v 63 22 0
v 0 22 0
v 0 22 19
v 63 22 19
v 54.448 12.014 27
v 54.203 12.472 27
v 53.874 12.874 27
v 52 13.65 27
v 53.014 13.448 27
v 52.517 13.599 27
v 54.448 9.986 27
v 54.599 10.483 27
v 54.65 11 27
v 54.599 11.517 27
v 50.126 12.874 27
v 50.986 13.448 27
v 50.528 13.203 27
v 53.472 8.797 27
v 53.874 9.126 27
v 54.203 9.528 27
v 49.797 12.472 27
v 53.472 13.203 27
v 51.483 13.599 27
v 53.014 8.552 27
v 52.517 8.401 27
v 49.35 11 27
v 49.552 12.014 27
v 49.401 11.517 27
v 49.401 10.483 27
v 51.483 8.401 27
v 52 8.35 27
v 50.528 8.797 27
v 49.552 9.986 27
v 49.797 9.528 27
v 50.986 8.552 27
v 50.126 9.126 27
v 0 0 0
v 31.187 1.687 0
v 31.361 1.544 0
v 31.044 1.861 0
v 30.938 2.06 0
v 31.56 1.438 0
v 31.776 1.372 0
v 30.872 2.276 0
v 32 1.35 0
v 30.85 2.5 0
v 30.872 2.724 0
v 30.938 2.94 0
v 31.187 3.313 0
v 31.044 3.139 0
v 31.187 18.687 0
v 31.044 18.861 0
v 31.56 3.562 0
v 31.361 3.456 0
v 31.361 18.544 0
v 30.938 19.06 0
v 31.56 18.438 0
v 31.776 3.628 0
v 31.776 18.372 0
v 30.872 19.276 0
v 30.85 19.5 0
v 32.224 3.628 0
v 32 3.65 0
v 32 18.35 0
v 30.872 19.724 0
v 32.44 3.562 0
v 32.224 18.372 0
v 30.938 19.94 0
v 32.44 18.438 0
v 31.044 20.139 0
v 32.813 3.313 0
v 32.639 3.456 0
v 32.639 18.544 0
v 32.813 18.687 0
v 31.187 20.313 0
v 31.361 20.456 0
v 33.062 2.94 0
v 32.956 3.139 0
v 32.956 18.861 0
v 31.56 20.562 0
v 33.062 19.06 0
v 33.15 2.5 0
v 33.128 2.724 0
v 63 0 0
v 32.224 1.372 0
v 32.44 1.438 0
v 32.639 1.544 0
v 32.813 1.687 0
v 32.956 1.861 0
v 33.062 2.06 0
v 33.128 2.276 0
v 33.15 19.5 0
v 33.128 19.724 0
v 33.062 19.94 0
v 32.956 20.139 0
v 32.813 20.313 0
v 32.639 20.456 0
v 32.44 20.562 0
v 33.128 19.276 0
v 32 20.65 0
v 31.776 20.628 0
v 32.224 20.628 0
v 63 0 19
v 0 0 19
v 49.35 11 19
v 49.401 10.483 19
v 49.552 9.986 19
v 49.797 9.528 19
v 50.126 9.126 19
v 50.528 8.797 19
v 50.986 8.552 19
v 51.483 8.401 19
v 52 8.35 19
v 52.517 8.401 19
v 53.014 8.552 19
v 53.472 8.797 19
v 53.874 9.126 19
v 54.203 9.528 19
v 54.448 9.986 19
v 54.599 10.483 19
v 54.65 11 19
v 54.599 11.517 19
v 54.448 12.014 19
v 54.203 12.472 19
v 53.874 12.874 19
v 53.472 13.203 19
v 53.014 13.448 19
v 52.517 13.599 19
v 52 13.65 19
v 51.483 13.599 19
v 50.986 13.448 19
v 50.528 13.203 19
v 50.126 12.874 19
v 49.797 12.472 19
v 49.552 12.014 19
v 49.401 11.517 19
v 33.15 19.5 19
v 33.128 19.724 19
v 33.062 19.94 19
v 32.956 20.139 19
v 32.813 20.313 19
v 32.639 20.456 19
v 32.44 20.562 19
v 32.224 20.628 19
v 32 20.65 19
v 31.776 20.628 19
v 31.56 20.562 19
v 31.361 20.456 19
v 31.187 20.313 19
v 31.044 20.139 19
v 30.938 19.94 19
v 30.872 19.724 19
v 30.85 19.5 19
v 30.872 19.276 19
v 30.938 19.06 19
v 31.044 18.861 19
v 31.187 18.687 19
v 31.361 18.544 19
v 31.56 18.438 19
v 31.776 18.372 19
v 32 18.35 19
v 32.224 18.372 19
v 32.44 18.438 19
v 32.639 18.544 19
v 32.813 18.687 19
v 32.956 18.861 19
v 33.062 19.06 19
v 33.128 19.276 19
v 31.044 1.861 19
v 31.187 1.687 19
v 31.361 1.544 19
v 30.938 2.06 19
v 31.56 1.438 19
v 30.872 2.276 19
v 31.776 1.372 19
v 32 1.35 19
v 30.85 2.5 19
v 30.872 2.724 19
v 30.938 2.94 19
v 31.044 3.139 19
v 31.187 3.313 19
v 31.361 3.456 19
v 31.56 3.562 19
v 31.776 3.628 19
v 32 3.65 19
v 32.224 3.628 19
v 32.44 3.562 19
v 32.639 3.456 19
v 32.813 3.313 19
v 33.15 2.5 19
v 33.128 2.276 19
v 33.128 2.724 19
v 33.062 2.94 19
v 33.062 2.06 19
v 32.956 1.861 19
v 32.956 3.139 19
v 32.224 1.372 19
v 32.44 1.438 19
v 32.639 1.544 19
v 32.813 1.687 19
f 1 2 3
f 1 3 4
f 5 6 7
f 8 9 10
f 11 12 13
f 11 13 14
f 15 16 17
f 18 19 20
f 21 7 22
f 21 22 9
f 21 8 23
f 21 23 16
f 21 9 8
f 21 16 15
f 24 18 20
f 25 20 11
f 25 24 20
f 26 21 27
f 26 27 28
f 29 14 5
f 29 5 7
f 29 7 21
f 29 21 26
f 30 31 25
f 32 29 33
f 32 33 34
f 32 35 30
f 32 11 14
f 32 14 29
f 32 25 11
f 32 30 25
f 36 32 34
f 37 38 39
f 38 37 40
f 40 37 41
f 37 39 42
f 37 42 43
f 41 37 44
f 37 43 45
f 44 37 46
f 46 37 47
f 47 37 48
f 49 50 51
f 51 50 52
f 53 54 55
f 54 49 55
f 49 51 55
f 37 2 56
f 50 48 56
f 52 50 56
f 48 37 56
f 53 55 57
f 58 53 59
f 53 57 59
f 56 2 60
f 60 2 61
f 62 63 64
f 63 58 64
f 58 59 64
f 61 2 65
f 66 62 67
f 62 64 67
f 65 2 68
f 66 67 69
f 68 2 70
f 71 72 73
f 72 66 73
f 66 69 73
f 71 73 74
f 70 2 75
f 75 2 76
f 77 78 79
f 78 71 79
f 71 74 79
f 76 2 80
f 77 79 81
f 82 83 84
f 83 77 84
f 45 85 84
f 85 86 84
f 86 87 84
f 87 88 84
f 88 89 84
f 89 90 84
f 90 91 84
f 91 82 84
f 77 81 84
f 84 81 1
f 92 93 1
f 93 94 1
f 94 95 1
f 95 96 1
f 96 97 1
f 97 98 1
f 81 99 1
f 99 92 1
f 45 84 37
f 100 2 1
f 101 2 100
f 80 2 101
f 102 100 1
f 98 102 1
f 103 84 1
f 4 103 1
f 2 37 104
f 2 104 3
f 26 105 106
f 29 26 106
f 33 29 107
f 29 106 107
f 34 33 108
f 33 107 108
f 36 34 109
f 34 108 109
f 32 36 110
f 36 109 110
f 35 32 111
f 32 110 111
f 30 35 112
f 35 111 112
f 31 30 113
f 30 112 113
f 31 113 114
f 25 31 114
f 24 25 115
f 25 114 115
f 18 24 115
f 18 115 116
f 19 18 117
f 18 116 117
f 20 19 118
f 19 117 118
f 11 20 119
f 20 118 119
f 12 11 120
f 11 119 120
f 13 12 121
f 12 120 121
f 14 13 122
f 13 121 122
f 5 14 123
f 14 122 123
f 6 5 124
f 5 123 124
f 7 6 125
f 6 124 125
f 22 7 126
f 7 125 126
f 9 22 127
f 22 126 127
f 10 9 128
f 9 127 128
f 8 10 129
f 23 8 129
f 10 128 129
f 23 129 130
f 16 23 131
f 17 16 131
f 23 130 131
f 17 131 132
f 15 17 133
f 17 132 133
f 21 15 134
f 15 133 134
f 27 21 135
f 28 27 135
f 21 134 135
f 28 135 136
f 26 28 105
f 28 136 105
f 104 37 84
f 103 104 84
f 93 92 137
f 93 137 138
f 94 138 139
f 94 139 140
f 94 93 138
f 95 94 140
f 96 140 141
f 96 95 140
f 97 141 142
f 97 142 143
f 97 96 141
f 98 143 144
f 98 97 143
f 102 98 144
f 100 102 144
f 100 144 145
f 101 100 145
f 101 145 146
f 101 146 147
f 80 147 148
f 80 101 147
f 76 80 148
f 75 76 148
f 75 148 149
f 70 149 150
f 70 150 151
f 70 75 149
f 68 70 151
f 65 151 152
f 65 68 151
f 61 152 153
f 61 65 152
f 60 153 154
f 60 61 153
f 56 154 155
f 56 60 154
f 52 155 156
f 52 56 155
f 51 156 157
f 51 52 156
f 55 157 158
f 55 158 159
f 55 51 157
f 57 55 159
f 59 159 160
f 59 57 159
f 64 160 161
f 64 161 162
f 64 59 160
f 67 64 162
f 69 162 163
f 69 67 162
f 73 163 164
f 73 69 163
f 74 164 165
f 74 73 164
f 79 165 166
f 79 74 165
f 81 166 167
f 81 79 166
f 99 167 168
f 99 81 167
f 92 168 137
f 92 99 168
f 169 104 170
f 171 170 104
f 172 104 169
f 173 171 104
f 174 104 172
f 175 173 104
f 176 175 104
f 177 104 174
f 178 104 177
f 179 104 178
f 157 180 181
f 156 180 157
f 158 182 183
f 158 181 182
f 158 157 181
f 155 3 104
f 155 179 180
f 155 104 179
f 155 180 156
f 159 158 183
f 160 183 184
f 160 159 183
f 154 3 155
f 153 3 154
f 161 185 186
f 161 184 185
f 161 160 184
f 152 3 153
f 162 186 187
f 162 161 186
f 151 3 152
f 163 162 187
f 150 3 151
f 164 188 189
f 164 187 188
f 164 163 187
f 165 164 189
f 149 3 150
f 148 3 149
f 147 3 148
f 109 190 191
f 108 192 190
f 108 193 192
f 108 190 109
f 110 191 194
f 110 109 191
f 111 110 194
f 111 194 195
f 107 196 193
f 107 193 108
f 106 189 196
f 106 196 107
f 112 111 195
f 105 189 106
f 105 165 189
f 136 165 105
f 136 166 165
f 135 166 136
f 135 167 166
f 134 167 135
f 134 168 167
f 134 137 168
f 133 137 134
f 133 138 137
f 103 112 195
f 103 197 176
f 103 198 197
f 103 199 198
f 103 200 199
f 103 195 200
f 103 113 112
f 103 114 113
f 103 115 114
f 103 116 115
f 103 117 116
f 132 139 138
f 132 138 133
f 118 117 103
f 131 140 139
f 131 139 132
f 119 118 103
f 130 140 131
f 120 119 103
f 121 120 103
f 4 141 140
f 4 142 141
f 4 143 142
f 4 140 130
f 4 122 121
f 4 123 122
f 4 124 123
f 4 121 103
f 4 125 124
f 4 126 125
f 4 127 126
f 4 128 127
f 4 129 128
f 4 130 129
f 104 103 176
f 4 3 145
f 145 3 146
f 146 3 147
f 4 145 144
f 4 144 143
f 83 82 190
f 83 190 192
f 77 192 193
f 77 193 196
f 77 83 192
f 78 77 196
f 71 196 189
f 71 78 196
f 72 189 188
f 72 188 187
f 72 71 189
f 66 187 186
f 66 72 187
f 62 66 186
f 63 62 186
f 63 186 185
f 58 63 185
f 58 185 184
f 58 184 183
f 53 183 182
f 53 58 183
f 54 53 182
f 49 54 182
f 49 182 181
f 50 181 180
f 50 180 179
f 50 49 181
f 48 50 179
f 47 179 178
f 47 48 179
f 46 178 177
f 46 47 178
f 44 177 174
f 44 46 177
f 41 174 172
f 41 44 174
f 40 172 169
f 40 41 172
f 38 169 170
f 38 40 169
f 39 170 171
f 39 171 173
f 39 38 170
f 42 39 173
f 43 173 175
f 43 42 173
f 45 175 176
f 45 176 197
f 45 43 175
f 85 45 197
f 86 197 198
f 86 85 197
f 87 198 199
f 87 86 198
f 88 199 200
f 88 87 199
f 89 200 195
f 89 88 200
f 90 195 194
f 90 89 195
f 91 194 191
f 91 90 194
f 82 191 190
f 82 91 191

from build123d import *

# Parameters (mm, degrees)
SKETCH1_W           = 63
SKETCH1_H           = 22
SKETCH1_R           = 1.15
BOSS_EXTRUDE1_DEPTH = 19
SKETCH2_R           = 2.65
BOSS_EXTRUDE2_DEPTH = 8


with BuildPart() as part:
    # Sketch1 → Boss-Extrude1 (new body)
    with BuildSketch(Plane.XY):
        with Locations((31.5, 11)):
            Rectangle(SKETCH1_W, SKETCH1_H)
        with Locations((32, 19.5)):
            Circle(SKETCH1_R, mode=Mode.SUBTRACT)
        with Locations((32, 2.5)):
            Circle(SKETCH1_R, mode=Mode.SUBTRACT)
    extrude(amount=BOSS_EXTRUDE1_DEPTH)

    # Sketch2 → Boss-Extrude2 (add)
    with BuildSketch(Plane.XY.offset(19)):
        with Locations(Location((52, 11, 0), (0, 0, 180))):
            Circle(SKETCH2_R)
    extrude(amount=BOSS_EXTRUDE2_DEPTH)


solid = part.part
